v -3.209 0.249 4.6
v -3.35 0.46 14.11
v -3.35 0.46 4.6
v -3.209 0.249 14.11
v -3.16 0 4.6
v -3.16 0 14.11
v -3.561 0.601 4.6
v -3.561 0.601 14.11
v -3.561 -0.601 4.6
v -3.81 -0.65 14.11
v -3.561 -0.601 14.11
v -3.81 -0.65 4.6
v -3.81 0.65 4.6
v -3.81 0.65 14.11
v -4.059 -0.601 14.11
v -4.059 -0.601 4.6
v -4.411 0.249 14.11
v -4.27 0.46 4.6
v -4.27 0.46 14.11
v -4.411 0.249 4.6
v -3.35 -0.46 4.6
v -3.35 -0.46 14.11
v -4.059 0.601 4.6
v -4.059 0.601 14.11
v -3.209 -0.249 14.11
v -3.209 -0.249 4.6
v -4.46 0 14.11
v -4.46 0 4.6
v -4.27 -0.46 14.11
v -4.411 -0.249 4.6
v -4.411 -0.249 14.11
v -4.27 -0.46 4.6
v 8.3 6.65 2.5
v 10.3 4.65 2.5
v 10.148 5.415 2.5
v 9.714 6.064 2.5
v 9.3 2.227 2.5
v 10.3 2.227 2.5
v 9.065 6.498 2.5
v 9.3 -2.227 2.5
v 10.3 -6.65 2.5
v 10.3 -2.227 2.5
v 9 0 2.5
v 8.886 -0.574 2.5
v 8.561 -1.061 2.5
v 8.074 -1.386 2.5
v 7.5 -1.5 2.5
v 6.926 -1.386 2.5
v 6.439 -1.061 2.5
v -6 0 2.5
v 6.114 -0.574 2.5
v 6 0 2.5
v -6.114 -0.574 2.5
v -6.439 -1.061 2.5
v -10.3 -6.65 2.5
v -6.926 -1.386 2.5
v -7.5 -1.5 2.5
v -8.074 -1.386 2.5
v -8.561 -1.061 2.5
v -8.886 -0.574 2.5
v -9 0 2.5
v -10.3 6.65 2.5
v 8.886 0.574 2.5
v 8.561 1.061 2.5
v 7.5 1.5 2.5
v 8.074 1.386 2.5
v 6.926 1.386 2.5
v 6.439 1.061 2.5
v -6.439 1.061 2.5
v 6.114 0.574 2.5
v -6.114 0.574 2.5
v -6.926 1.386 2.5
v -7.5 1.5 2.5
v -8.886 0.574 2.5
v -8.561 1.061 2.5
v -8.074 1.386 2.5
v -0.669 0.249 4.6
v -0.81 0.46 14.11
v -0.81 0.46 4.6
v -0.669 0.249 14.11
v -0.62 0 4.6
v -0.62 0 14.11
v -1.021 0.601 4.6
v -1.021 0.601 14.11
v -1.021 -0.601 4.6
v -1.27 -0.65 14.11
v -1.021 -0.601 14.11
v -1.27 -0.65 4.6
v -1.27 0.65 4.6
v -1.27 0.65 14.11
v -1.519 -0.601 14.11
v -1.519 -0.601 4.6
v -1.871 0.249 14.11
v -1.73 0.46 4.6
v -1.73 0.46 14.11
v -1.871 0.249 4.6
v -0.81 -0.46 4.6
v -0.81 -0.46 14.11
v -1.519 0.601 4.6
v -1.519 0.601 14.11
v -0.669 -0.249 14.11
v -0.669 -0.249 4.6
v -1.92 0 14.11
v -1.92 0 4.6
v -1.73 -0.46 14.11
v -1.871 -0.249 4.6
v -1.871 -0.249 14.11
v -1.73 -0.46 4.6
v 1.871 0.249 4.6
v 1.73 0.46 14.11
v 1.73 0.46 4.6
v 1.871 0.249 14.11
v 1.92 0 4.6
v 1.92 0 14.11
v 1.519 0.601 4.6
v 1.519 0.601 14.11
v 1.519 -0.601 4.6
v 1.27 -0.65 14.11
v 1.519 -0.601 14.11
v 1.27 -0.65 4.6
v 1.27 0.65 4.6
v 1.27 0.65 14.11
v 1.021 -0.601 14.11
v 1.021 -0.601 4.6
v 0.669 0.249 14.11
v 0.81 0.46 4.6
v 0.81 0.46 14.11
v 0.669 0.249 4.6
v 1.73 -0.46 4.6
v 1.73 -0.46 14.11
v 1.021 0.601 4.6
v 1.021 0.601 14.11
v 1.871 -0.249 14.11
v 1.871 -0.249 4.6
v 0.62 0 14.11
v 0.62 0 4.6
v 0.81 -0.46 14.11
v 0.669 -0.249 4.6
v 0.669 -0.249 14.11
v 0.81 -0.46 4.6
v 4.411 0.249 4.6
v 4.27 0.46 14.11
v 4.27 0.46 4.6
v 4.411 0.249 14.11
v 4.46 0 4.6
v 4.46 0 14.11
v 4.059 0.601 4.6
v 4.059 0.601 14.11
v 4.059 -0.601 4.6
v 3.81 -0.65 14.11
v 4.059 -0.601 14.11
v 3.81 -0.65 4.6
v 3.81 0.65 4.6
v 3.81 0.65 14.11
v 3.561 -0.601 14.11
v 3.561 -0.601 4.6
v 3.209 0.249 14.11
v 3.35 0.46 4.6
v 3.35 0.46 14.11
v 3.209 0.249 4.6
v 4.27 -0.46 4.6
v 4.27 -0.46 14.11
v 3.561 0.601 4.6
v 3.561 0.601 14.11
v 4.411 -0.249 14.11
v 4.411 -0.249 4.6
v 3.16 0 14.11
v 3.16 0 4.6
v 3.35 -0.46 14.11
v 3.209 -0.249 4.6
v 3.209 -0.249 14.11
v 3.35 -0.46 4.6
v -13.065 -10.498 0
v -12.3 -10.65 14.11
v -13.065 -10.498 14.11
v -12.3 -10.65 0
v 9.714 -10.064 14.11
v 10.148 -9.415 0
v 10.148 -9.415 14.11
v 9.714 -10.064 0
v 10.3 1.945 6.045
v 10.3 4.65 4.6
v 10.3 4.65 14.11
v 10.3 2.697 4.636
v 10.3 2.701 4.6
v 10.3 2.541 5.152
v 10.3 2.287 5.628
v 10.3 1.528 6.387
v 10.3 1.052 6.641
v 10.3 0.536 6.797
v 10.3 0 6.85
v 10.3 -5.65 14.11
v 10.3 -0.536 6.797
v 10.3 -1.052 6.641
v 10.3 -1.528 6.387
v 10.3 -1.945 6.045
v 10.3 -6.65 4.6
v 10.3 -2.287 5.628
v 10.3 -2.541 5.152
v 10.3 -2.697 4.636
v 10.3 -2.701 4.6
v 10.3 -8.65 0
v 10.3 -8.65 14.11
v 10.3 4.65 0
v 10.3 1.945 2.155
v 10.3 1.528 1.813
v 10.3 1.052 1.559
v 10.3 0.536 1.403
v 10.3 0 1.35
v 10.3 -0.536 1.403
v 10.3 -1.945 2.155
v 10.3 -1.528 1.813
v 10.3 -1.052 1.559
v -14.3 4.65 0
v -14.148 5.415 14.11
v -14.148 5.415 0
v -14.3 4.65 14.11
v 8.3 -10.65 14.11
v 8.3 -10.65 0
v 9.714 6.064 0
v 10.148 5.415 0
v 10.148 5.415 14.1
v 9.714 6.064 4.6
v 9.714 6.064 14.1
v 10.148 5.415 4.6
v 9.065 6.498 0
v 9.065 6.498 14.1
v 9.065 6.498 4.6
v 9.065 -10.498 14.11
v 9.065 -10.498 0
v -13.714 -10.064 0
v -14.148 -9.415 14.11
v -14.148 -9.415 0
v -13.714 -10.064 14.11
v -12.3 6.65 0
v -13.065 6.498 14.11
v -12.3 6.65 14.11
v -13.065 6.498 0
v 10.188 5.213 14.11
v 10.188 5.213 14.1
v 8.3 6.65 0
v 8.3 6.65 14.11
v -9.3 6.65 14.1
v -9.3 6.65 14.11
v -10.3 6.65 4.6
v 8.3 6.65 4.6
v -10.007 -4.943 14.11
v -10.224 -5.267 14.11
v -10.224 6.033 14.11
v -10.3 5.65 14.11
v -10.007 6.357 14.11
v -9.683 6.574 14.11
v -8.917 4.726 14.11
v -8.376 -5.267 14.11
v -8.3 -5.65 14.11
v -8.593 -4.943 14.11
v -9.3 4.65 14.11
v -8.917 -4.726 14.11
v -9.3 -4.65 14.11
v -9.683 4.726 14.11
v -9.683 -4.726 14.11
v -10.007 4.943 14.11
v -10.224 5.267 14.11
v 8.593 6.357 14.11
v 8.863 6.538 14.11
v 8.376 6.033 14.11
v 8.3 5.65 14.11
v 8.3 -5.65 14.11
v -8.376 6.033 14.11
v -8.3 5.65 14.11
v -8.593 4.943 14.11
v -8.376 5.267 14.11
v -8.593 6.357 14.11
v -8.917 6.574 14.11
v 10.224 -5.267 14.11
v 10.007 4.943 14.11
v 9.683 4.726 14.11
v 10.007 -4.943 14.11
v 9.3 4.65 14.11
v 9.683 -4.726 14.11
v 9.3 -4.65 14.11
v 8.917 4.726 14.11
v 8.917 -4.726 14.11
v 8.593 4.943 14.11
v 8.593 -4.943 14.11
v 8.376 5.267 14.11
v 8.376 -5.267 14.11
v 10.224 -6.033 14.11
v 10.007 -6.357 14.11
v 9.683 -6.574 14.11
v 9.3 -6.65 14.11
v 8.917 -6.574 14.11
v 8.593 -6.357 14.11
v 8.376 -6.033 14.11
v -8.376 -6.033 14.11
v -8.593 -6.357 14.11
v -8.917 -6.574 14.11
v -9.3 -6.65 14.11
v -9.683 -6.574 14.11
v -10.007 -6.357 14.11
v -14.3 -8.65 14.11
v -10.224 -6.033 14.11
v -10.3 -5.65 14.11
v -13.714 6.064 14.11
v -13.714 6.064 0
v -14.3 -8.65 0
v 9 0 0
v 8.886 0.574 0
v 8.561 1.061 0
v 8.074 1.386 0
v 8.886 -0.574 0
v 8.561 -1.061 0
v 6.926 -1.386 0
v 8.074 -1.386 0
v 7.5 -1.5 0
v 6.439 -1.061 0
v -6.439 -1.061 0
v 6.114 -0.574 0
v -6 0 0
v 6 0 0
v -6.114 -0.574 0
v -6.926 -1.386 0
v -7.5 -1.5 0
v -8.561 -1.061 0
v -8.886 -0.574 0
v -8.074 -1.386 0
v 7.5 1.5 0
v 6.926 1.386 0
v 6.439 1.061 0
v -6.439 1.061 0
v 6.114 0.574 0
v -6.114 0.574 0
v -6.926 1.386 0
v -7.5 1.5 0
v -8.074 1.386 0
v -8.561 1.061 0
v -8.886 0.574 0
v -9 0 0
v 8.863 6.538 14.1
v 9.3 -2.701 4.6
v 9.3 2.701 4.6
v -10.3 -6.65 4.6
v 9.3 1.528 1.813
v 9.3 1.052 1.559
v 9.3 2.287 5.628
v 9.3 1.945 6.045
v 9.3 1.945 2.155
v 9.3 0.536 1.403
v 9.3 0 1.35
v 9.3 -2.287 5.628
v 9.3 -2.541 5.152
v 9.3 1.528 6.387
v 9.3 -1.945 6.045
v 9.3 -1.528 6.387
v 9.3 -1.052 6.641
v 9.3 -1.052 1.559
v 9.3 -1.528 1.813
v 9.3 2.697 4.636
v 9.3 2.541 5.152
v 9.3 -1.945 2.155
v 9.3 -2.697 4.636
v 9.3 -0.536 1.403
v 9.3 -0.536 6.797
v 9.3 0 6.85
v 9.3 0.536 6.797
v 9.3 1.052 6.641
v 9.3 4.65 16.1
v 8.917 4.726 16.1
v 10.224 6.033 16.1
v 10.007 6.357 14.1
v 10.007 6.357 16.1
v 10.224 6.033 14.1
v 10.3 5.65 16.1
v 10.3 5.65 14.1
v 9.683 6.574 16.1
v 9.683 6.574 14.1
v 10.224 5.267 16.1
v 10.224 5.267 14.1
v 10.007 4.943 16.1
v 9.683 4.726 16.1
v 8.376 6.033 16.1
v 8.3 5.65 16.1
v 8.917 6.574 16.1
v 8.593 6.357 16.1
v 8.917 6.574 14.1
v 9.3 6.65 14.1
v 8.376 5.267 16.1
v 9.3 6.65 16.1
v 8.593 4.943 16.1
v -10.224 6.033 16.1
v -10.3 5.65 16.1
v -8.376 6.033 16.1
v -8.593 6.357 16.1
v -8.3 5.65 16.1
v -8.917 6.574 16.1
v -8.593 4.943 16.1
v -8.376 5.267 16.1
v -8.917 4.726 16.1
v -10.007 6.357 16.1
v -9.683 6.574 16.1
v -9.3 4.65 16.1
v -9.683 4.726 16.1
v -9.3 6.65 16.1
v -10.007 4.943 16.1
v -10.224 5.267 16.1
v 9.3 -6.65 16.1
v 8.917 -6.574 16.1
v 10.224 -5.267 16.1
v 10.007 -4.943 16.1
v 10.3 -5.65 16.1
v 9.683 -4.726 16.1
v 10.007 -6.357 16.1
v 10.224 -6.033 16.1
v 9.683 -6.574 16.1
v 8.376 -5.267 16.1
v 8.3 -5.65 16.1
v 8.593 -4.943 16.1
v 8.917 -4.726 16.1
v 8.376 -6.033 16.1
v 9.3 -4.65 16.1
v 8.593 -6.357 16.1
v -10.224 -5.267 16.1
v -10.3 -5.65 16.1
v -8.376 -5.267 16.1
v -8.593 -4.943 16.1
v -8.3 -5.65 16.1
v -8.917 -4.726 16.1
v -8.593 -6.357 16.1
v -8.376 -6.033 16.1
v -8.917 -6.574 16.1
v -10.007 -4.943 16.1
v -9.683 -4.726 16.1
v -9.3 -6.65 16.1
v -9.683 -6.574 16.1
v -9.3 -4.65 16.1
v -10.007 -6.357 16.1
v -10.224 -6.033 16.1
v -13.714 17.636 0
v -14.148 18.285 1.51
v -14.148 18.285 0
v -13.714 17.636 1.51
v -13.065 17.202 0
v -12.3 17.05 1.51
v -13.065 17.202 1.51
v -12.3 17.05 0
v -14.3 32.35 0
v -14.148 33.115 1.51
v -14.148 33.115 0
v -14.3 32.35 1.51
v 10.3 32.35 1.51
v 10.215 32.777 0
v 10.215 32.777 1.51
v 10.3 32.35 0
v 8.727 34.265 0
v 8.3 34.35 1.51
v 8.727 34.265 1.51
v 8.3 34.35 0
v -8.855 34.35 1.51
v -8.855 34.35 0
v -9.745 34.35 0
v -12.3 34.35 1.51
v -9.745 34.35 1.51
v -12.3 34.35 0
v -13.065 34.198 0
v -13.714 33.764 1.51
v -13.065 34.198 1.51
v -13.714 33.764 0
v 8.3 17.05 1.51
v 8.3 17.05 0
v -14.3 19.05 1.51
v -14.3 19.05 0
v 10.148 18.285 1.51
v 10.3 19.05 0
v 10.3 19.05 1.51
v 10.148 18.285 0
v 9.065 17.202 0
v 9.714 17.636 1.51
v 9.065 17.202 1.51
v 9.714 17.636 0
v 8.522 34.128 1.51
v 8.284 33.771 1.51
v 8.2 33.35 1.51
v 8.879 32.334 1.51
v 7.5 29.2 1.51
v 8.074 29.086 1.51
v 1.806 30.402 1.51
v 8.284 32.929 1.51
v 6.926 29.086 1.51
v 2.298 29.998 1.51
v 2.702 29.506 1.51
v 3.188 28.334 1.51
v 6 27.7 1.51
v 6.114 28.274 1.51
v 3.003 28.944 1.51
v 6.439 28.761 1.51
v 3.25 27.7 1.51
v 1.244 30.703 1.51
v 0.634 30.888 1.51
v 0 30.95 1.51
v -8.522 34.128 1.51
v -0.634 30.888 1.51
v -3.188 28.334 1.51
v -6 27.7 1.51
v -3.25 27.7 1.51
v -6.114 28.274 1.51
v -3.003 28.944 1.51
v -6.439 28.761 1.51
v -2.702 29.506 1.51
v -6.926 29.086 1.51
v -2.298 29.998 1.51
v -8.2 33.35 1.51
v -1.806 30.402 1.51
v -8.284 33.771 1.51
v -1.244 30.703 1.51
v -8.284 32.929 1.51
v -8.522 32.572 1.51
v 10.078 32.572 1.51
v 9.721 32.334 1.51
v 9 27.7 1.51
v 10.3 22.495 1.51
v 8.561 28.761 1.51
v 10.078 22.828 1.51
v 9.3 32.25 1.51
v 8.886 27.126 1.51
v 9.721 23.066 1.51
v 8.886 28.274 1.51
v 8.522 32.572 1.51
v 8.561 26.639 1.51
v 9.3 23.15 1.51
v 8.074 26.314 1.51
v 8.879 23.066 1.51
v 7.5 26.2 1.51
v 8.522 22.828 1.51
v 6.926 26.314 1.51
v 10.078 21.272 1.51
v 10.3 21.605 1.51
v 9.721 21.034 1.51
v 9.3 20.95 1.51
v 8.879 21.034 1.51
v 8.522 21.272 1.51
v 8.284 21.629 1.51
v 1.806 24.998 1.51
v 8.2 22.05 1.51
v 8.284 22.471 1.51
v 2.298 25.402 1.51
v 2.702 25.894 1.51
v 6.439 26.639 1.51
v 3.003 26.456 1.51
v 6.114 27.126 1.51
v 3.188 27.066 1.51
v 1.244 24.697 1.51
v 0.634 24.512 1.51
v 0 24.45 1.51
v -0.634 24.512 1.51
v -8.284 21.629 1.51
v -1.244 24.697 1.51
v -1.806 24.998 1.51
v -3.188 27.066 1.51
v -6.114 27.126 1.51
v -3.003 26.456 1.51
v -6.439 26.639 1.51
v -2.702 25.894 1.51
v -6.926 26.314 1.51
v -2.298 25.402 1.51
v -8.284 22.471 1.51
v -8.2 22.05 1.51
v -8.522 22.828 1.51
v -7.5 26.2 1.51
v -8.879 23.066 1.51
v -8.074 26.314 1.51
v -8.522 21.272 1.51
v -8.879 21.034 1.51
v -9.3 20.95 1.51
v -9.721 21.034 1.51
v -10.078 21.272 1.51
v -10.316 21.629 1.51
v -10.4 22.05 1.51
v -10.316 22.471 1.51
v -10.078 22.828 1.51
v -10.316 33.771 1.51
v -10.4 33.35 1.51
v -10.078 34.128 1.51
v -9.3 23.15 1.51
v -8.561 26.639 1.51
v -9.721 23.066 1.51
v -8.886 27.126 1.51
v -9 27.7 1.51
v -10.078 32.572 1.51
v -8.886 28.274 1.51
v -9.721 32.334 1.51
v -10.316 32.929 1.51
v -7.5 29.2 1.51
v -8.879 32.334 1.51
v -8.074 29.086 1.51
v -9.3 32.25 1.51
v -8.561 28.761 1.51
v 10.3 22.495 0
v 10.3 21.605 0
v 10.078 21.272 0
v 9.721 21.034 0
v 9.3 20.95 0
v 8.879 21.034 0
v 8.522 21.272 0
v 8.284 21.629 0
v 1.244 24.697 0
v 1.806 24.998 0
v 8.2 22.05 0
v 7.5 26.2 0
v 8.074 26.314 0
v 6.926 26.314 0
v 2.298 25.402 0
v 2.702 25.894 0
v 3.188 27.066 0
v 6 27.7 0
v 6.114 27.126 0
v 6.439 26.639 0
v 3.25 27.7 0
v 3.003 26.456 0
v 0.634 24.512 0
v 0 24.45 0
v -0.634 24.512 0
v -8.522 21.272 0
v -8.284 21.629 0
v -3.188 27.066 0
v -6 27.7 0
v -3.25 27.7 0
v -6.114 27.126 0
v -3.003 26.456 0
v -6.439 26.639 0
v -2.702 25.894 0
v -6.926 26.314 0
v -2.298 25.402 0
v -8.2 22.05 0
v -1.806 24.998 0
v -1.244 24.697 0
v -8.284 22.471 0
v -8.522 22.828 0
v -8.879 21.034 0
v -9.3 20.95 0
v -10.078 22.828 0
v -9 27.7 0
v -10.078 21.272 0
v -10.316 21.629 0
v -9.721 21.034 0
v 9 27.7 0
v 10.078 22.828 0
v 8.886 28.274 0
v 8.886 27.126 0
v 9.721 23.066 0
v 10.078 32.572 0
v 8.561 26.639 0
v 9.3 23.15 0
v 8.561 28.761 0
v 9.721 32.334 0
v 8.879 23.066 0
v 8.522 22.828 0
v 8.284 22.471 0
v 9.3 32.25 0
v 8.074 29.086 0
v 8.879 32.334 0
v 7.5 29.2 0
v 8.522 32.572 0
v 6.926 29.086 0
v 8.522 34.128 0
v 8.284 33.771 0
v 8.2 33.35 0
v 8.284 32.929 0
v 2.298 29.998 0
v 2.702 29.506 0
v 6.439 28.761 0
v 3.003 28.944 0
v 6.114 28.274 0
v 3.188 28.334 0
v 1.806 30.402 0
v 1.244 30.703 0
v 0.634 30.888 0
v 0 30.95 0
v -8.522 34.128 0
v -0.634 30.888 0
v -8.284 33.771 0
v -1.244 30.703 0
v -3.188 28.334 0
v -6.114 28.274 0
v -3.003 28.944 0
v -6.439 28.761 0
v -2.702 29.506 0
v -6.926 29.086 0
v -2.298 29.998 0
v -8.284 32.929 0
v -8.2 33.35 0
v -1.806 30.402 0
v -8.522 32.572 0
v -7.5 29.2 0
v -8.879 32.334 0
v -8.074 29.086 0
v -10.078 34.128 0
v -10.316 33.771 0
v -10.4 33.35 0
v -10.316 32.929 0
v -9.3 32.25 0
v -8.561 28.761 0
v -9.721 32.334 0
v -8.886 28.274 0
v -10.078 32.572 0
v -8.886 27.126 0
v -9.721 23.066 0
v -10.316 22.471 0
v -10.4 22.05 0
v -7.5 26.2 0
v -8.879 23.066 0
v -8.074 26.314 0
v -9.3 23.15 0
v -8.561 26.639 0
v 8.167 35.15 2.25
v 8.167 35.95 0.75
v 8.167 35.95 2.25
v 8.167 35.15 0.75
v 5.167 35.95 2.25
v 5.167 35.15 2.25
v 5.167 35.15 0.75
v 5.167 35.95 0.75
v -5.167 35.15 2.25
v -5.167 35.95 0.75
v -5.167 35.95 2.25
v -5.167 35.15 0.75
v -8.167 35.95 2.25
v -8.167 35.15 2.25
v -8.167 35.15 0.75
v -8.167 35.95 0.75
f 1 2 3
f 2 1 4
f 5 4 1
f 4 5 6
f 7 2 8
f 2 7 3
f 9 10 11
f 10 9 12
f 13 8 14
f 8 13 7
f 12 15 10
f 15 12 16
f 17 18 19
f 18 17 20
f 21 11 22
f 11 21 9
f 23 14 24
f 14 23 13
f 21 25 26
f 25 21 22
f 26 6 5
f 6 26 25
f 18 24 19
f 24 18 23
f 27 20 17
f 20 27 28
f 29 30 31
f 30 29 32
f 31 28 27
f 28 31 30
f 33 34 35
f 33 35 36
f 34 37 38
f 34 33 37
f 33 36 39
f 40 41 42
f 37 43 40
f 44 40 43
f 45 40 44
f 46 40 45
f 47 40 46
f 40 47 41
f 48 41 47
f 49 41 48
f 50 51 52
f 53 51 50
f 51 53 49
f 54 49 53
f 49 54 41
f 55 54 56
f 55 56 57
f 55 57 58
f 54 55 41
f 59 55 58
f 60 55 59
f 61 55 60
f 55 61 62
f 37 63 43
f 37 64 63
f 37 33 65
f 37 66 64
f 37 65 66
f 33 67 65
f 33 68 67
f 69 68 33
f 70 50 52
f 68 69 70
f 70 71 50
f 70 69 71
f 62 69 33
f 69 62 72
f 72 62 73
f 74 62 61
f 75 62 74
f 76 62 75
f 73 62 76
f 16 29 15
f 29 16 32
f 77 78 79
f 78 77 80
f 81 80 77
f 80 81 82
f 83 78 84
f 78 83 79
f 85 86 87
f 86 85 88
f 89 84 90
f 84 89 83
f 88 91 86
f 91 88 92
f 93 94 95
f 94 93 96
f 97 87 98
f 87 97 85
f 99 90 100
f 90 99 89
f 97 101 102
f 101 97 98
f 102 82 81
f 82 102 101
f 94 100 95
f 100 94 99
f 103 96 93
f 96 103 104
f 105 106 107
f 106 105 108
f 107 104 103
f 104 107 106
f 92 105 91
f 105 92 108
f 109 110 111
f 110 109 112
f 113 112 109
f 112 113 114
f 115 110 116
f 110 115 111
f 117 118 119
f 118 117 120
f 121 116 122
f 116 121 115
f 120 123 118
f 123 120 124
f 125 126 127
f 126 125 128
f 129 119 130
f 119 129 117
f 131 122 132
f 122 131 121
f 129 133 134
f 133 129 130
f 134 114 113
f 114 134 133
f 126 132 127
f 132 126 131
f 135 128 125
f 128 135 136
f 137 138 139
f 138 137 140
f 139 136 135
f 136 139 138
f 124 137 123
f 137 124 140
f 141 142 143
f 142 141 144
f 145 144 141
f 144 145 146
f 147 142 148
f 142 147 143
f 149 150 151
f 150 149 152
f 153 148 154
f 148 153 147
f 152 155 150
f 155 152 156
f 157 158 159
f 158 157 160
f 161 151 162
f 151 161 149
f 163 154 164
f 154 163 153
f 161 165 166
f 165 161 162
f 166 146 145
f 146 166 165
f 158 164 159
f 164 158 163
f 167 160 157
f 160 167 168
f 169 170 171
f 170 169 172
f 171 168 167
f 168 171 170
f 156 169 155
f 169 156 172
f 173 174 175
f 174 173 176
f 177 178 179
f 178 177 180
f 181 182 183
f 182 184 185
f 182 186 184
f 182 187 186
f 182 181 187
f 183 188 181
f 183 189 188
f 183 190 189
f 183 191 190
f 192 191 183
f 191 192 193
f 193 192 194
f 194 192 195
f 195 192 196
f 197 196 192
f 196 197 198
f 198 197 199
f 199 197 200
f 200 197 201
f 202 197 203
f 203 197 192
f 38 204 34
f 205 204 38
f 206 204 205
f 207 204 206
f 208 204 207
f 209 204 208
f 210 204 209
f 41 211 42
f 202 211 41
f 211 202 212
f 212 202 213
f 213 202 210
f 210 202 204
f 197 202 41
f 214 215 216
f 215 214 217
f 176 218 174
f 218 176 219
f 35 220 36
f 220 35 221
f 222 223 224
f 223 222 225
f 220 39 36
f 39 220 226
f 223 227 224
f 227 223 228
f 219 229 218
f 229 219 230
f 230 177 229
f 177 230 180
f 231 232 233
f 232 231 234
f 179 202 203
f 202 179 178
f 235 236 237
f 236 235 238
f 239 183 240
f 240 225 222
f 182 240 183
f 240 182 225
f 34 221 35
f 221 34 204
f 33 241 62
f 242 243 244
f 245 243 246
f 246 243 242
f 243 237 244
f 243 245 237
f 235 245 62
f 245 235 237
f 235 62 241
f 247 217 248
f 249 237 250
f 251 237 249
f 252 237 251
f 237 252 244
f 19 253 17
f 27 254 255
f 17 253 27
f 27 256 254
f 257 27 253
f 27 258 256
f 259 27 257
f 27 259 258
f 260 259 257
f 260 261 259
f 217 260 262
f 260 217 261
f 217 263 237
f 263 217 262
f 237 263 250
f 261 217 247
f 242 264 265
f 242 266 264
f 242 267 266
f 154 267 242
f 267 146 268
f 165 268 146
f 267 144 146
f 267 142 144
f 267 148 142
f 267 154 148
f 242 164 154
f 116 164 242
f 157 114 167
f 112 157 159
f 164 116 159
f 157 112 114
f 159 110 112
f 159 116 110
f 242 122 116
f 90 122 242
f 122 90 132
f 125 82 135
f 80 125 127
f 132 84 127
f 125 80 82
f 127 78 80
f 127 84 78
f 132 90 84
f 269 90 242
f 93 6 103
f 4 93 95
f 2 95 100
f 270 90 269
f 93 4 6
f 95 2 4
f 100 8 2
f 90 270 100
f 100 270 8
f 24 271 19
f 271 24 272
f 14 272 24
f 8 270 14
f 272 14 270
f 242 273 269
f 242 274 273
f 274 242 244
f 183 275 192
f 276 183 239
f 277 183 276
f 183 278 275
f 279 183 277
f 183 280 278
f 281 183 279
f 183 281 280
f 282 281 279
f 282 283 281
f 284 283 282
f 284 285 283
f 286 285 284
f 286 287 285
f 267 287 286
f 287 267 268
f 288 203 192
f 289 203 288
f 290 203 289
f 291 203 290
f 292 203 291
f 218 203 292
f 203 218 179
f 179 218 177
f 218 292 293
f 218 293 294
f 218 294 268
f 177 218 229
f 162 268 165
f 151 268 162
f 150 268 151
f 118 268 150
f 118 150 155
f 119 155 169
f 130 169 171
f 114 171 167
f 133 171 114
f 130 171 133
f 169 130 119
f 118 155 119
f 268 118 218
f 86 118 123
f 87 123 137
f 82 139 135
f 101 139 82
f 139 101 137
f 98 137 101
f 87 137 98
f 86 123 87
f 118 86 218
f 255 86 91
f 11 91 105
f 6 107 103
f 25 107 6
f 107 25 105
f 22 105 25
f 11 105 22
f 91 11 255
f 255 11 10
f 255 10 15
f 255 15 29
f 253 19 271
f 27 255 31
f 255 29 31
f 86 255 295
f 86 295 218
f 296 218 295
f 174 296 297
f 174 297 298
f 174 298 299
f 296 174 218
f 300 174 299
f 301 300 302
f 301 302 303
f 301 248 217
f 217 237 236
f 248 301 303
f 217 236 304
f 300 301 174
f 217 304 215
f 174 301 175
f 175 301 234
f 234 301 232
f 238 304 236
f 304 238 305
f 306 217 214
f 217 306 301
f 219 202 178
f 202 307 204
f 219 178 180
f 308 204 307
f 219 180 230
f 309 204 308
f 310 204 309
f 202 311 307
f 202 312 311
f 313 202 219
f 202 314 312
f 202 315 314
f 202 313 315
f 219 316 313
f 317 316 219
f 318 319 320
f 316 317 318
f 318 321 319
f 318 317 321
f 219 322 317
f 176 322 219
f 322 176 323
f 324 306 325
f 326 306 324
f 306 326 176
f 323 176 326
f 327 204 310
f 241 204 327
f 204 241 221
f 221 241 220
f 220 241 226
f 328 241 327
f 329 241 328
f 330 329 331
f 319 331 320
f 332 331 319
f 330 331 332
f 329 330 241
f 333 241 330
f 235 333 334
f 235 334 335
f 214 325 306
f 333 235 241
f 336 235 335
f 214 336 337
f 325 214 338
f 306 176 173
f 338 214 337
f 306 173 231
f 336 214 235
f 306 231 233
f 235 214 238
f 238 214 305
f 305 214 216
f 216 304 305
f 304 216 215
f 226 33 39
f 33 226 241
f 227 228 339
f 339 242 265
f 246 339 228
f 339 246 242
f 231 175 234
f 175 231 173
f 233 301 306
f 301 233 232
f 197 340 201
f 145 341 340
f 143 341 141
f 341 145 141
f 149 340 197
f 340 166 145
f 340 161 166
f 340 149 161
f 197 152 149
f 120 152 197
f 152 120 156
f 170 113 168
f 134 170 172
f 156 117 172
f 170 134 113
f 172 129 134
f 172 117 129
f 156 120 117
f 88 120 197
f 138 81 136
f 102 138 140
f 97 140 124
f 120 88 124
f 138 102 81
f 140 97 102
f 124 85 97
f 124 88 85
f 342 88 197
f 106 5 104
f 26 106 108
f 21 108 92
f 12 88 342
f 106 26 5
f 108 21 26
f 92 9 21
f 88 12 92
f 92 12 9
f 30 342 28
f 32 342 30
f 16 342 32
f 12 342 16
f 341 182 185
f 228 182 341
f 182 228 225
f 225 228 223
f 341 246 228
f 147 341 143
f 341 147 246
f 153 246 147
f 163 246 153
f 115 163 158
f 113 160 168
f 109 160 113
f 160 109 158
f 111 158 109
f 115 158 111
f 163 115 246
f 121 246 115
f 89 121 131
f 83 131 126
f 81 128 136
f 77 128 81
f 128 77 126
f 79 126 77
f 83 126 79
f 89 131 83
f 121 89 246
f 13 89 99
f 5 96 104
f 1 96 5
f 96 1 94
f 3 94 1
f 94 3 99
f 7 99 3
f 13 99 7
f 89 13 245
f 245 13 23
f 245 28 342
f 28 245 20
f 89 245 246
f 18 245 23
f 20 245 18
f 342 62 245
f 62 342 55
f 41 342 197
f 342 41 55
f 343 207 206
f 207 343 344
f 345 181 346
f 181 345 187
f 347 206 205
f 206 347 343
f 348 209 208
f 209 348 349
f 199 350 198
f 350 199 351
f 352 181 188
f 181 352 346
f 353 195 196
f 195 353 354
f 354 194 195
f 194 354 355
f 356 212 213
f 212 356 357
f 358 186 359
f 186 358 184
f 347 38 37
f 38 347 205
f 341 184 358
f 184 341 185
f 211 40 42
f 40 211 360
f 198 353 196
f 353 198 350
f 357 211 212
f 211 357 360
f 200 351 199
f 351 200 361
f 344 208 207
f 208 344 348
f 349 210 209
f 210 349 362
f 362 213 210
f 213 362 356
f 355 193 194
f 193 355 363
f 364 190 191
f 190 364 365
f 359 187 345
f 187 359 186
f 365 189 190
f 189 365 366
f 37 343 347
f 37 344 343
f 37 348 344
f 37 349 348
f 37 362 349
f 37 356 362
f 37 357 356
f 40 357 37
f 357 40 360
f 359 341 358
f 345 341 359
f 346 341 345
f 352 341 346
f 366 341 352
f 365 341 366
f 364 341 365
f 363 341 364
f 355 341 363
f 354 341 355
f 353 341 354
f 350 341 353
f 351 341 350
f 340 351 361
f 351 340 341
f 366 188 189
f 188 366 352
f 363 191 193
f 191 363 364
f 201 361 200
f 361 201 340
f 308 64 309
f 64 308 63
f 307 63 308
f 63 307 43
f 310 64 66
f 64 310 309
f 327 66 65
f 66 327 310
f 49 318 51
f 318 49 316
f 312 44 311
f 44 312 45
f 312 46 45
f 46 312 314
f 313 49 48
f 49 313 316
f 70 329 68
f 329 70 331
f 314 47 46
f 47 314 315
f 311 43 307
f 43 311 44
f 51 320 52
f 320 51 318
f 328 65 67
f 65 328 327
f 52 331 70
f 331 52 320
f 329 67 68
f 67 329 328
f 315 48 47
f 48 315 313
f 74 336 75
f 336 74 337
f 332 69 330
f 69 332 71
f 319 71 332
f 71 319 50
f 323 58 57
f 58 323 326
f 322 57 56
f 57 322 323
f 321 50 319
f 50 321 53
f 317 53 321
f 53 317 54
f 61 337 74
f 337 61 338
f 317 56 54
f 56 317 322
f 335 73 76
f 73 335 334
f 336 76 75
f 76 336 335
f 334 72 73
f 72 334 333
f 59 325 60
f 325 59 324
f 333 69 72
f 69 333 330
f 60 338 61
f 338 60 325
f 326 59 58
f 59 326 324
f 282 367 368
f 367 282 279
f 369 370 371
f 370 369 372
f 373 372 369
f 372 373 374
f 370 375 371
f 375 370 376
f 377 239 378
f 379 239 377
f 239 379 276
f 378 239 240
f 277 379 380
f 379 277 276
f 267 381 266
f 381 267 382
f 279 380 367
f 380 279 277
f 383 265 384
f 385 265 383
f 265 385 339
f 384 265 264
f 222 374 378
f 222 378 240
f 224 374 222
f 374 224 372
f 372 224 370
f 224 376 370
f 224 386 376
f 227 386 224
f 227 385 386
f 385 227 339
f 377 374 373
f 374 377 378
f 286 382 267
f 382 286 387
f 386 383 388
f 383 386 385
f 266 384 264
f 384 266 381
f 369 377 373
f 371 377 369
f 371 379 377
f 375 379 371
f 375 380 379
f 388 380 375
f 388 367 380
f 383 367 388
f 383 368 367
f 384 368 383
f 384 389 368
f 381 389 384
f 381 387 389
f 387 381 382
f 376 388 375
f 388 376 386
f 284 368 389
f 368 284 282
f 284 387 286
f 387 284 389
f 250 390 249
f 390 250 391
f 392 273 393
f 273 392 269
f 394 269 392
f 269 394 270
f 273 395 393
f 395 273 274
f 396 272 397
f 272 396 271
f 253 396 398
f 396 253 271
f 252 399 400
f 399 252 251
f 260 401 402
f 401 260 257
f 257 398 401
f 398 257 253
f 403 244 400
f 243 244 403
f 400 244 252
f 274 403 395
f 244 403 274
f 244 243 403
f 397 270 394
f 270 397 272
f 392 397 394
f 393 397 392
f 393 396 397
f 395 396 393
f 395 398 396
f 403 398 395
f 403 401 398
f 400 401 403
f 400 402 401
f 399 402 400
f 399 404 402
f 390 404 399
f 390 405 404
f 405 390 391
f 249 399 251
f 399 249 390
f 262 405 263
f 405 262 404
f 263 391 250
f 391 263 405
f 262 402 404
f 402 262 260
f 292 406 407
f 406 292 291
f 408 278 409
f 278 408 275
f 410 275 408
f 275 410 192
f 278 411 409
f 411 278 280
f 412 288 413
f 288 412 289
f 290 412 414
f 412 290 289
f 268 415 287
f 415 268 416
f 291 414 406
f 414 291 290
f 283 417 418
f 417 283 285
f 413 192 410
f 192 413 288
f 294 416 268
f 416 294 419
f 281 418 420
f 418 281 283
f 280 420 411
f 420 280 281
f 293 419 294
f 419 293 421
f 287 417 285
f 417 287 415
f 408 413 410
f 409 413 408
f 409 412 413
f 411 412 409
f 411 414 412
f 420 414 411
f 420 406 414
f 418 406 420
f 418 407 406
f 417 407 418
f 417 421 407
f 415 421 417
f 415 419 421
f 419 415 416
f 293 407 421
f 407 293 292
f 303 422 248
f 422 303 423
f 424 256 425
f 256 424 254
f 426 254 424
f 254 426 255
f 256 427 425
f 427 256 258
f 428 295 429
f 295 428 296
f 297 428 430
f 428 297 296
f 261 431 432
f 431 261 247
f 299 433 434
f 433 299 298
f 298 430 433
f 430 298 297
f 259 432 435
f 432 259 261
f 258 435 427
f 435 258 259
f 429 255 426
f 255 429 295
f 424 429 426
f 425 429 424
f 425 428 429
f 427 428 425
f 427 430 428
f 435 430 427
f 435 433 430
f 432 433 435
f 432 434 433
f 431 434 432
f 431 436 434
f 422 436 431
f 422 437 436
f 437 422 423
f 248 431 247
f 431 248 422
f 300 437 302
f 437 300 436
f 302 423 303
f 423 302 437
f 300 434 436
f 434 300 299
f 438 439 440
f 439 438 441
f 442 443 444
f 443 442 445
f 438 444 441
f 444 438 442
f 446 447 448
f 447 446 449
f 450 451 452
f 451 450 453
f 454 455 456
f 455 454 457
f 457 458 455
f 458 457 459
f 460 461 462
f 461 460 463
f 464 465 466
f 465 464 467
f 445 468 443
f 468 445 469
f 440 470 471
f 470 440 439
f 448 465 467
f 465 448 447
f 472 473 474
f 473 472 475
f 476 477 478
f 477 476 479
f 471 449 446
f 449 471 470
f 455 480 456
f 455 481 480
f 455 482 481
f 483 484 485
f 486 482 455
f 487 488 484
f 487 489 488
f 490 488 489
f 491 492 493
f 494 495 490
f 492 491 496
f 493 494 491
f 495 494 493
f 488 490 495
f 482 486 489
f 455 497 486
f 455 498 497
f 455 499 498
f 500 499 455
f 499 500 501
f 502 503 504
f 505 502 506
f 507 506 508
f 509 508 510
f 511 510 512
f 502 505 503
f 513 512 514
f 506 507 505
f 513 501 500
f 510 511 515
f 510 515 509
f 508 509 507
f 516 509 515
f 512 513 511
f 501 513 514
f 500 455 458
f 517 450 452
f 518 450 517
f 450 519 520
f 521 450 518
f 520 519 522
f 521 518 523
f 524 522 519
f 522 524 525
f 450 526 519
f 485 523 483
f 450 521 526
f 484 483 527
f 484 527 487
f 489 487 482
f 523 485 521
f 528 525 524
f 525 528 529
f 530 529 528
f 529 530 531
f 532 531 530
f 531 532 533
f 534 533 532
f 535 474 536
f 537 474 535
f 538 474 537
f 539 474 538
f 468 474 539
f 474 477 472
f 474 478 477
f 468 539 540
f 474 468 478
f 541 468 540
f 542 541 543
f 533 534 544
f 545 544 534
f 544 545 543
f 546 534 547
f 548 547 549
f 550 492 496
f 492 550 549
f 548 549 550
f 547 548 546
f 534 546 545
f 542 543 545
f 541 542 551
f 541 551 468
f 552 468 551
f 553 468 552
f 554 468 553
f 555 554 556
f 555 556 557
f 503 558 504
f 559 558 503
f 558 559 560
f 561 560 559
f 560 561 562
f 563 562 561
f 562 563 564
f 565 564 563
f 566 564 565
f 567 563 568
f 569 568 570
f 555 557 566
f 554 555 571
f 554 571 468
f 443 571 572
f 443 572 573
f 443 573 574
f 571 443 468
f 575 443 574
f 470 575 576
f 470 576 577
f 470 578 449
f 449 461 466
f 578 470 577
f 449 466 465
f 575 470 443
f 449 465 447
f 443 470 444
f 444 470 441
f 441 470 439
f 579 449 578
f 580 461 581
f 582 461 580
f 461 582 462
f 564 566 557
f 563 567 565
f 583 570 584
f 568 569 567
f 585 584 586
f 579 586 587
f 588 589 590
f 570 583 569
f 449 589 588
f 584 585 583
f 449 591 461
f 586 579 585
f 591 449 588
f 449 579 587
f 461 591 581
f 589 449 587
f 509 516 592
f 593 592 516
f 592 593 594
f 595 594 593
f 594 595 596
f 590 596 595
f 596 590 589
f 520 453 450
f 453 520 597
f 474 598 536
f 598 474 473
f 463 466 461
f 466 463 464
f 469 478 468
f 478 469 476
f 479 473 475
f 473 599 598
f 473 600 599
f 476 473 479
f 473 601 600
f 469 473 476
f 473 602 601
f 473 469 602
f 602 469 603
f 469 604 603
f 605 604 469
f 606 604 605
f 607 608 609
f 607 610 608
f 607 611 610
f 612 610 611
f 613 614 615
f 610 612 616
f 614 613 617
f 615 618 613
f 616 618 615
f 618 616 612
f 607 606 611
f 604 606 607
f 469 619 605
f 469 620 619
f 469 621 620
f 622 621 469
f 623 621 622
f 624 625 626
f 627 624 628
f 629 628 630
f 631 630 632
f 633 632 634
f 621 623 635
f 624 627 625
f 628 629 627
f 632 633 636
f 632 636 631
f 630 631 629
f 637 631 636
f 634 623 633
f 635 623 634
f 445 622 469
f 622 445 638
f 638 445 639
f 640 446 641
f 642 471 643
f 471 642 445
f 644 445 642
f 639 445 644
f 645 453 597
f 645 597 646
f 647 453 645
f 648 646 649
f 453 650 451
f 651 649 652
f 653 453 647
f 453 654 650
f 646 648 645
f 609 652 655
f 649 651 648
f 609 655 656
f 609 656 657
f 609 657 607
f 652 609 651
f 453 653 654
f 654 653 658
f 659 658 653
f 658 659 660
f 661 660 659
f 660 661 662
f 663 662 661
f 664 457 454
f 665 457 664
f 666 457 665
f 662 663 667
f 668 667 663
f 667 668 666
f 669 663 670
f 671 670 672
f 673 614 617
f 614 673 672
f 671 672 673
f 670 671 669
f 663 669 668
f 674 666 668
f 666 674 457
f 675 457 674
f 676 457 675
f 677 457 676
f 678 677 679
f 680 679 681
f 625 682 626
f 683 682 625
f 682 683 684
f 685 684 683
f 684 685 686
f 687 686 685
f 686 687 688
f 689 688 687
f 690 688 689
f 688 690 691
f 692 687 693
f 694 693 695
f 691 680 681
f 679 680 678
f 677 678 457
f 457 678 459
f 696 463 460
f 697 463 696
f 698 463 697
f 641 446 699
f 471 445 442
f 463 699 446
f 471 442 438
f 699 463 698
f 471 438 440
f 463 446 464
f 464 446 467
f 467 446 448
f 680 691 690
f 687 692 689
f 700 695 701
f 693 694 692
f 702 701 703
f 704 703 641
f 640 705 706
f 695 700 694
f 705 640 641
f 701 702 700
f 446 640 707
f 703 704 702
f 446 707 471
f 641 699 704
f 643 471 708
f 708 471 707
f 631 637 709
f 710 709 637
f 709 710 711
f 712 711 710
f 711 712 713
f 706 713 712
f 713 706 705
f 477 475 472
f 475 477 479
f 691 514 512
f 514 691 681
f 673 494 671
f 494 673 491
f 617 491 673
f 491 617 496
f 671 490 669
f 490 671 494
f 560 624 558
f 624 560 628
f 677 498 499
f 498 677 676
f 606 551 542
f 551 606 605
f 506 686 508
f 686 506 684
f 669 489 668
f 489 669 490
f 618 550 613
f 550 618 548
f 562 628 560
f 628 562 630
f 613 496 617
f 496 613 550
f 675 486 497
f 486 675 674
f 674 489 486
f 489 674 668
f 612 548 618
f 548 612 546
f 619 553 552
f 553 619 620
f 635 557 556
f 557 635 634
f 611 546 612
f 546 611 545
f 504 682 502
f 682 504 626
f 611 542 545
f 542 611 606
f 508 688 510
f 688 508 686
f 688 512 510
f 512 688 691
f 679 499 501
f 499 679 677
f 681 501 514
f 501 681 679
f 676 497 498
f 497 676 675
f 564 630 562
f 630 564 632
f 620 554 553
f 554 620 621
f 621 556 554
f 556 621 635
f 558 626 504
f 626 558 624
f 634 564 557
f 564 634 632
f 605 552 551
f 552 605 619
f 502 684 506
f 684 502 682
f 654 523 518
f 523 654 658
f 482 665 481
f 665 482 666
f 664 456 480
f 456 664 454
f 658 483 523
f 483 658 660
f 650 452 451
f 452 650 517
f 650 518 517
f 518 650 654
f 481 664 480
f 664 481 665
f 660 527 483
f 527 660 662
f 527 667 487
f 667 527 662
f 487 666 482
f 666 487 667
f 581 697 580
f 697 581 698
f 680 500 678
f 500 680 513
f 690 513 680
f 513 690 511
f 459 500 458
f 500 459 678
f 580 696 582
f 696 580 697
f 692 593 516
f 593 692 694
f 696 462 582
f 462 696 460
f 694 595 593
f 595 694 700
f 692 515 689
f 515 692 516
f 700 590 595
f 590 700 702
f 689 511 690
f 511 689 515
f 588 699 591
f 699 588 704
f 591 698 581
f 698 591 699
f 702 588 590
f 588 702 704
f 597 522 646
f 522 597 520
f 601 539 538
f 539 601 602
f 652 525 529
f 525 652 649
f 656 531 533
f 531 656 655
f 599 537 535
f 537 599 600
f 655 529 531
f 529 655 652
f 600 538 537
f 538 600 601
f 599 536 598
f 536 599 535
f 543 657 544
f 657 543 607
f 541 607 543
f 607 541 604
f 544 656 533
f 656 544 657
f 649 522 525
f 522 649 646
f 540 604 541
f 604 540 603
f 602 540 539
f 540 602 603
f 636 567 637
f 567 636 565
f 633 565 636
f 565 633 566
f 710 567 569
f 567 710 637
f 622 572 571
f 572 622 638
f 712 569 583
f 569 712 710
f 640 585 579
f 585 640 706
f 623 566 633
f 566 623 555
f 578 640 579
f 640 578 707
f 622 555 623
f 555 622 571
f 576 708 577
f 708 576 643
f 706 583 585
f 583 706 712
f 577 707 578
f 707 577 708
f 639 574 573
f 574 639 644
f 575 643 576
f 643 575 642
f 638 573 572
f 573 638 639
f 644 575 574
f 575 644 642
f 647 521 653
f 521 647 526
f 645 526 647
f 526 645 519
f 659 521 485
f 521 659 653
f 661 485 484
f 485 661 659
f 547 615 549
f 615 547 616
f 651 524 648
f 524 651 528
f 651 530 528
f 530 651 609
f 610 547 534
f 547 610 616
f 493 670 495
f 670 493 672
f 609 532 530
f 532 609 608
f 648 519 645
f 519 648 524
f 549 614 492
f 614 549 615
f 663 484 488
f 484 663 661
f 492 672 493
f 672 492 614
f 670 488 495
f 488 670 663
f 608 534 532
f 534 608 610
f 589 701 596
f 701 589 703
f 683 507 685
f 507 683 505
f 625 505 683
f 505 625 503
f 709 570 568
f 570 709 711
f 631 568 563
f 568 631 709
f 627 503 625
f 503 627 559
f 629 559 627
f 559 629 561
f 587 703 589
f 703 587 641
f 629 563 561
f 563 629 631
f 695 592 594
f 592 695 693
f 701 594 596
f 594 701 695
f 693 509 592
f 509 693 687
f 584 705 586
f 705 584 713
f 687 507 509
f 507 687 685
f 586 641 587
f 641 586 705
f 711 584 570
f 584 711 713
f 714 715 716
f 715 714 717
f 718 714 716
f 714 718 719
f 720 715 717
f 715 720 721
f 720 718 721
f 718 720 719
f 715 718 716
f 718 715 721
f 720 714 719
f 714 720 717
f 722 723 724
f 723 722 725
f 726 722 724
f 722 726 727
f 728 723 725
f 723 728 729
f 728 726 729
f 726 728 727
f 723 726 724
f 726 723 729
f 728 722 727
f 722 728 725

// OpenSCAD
/*
 * VL53L0X V2 TOF Sensor Case - Clamshell Design
 * Two-part clamshell design - most creative and user-friendly!
 * 
 * Features:
 * - Two-part design: base and top
 * - Sensor simply sits in base, top clips on
 * - No complex insertion needed
 * - Easy to remove for maintenance
 */

// ==========================================
// CONFIGURATION
// ==========================================

pcb_length = 20.0;
pcb_width = 12.7;
pcb_thickness = 1.6;
pin_spacing = 2.54;
pin_count = 4;
pin_diameter = 0.8;
pin_length = 10.0;
lens_diameter = 4.5;
wall_thickness = 2.0;
base_thickness = 2.5;
top_thickness = 1.5;
clearance = 0.3;
corner_radius = 2.0;

// ==========================================
// HELPER MODULES
// ==========================================

module rounded_square(size, r) {
    translate([-size[0]/2, -size[1]/2, 0])
        minkowski() {
            cube([size[0] - r*2, size[1] - r*2, size[2]]);
            cylinder(r=r, h=0.01, $fn=16);
        }
}

// ==========================================
// BASE PART
// ==========================================

module base_part() {
    total_l = pcb_length + clearance * 2 + wall_thickness * 2;
    total_w = pcb_width + clearance * 2 + wall_thickness * 2;
    base_h = base_thickness + pcb_thickness + pin_length;
    
    difference() {
        // Base body
        rounded_square([total_l, total_w, base_h], corner_radius);
        
        // PCB cavity
        translate([
            -pcb_length/2 - clearance,
            -pcb_width/2 - clearance,
            base_thickness
        ])
            cube([
                pcb_length + clearance * 2,
                pcb_width + clearance * 2,
                pcb_thickness + 0.5
            ]);
        
        // Pin channels (through base)
        for (i = [0:pin_count-1]) {
            translate([
                -(pin_count-1) * pin_spacing/2 + i * pin_spacing,
                0,
                base_thickness
            ])
                cylinder(h = pin_length + 2, d = pin_diameter + 0.5, $fn=16);
        }
        
        // Lens opening (front)
        translate([
            total_l/2 - wall_thickness - 1,
            0,
            base_thickness + pcb_thickness
        ])
            rotate([0, 90, 0])
                cylinder(h = wall_thickness + 2, d = lens_diameter + 1, $fn=32);
        
        // Mounting holes
        translate([15/2, 0, -1])
            cylinder(h = base_thickness + 2, d = 3, $fn=16);
        translate([-15/2, 0, -1])
            cylinder(h = base_thickness + 2, d = 3, $fn=16);
    }
    
    // Alignment posts (for top part)
    post_d = 2.0;
    post_h = 2.0;
    translate([total_l/2 - 3, total_w/2 - 3, base_h])
        cylinder(h = post_h, d = post_d, $fn=16);
    translate([-total_l/2 + 3, total_w/2 - 3, base_h])
        cylinder(h = post_h, d = post_d, $fn=16);
    translate([total_l/2 - 3, -total_w/2 + 3, base_h])
        cylinder(h = post_h, d = post_d, $fn=16);
    translate([-total_l/2 + 3, -total_w/2 + 3, base_h])
        cylinder(h = post_h, d = post_d, $fn=16);
}

// ==========================================
// TOP PART (LID)
// ==========================================

module top_part() {
    total_l = pcb_length + clearance * 2 + wall_thickness * 2;
    total_w = pcb_width + clearance * 2 + wall_thickness * 2;
    
    difference() {
        // Top body
        rounded_square([total_l, total_w, top_thickness], corner_radius);
        
        // Lens opening
        translate([0, 0, -1])
            cylinder(h = top_thickness + 2, d = lens_diameter + 2, $fn=32);
        
        // Alignment holes
        post_d = 2.2; // Slightly larger for fit
        translate([total_l/2 - 3, total_w/2 - 3, -1])
            cylinder(h = top_thickness + 2, d = post_d, $fn=16);
        translate([-total_l/2 + 3, total_w/2 - 3, -1])
            cylinder(h = top_thickness + 2, d = post_d, $fn=16);
        translate([total_l/2 - 3, -total_w/2 + 3, -1])
            cylinder(h = top_thickness + 2, d = post_d, $fn=16);
        translate([-total_l/2 + 3, -total_w/2 + 3, -1])
            cylinder(h = top_thickness + 2, d = post_d, $fn=16);
        
        // Mounting holes
        translate([15/2, 0, -1])
            cylinder(h = top_thickness + 2, d = 3, $fn=16);
        translate([-15/2, 0, -1])
            cylinder(h = top_thickness + 2, d = 3, $fn=16);
    }
    
    // Retention tabs (snap into place)
    tab_w = 3.0;
    tab_t = 0.8;
    tab_h = 1.5;
    
    // Front tabs
    translate([pcb_length/3, total_w/2 - tab_t, top_thickness])
        cube([tab_w, tab_t, tab_h], center=true);
    translate([-pcb_length/3, total_w/2 - tab_t, top_thickness])
        cube([tab_w, tab_t, tab_h], center=true);
}

// ==========================================
// RENDER
// ==========================================

// Render both parts side by side for printing
base_part();

translate([0, pcb_width + 15, 0])
    top_part();

// Visual guide (uncomment to see sensor position)
/*
%translate([-pcb_length/2, -pcb_width/2, base_thickness])
    color("green", 0.3)
        cube([pcb_length, pcb_width, pcb_thickness]);
*/
